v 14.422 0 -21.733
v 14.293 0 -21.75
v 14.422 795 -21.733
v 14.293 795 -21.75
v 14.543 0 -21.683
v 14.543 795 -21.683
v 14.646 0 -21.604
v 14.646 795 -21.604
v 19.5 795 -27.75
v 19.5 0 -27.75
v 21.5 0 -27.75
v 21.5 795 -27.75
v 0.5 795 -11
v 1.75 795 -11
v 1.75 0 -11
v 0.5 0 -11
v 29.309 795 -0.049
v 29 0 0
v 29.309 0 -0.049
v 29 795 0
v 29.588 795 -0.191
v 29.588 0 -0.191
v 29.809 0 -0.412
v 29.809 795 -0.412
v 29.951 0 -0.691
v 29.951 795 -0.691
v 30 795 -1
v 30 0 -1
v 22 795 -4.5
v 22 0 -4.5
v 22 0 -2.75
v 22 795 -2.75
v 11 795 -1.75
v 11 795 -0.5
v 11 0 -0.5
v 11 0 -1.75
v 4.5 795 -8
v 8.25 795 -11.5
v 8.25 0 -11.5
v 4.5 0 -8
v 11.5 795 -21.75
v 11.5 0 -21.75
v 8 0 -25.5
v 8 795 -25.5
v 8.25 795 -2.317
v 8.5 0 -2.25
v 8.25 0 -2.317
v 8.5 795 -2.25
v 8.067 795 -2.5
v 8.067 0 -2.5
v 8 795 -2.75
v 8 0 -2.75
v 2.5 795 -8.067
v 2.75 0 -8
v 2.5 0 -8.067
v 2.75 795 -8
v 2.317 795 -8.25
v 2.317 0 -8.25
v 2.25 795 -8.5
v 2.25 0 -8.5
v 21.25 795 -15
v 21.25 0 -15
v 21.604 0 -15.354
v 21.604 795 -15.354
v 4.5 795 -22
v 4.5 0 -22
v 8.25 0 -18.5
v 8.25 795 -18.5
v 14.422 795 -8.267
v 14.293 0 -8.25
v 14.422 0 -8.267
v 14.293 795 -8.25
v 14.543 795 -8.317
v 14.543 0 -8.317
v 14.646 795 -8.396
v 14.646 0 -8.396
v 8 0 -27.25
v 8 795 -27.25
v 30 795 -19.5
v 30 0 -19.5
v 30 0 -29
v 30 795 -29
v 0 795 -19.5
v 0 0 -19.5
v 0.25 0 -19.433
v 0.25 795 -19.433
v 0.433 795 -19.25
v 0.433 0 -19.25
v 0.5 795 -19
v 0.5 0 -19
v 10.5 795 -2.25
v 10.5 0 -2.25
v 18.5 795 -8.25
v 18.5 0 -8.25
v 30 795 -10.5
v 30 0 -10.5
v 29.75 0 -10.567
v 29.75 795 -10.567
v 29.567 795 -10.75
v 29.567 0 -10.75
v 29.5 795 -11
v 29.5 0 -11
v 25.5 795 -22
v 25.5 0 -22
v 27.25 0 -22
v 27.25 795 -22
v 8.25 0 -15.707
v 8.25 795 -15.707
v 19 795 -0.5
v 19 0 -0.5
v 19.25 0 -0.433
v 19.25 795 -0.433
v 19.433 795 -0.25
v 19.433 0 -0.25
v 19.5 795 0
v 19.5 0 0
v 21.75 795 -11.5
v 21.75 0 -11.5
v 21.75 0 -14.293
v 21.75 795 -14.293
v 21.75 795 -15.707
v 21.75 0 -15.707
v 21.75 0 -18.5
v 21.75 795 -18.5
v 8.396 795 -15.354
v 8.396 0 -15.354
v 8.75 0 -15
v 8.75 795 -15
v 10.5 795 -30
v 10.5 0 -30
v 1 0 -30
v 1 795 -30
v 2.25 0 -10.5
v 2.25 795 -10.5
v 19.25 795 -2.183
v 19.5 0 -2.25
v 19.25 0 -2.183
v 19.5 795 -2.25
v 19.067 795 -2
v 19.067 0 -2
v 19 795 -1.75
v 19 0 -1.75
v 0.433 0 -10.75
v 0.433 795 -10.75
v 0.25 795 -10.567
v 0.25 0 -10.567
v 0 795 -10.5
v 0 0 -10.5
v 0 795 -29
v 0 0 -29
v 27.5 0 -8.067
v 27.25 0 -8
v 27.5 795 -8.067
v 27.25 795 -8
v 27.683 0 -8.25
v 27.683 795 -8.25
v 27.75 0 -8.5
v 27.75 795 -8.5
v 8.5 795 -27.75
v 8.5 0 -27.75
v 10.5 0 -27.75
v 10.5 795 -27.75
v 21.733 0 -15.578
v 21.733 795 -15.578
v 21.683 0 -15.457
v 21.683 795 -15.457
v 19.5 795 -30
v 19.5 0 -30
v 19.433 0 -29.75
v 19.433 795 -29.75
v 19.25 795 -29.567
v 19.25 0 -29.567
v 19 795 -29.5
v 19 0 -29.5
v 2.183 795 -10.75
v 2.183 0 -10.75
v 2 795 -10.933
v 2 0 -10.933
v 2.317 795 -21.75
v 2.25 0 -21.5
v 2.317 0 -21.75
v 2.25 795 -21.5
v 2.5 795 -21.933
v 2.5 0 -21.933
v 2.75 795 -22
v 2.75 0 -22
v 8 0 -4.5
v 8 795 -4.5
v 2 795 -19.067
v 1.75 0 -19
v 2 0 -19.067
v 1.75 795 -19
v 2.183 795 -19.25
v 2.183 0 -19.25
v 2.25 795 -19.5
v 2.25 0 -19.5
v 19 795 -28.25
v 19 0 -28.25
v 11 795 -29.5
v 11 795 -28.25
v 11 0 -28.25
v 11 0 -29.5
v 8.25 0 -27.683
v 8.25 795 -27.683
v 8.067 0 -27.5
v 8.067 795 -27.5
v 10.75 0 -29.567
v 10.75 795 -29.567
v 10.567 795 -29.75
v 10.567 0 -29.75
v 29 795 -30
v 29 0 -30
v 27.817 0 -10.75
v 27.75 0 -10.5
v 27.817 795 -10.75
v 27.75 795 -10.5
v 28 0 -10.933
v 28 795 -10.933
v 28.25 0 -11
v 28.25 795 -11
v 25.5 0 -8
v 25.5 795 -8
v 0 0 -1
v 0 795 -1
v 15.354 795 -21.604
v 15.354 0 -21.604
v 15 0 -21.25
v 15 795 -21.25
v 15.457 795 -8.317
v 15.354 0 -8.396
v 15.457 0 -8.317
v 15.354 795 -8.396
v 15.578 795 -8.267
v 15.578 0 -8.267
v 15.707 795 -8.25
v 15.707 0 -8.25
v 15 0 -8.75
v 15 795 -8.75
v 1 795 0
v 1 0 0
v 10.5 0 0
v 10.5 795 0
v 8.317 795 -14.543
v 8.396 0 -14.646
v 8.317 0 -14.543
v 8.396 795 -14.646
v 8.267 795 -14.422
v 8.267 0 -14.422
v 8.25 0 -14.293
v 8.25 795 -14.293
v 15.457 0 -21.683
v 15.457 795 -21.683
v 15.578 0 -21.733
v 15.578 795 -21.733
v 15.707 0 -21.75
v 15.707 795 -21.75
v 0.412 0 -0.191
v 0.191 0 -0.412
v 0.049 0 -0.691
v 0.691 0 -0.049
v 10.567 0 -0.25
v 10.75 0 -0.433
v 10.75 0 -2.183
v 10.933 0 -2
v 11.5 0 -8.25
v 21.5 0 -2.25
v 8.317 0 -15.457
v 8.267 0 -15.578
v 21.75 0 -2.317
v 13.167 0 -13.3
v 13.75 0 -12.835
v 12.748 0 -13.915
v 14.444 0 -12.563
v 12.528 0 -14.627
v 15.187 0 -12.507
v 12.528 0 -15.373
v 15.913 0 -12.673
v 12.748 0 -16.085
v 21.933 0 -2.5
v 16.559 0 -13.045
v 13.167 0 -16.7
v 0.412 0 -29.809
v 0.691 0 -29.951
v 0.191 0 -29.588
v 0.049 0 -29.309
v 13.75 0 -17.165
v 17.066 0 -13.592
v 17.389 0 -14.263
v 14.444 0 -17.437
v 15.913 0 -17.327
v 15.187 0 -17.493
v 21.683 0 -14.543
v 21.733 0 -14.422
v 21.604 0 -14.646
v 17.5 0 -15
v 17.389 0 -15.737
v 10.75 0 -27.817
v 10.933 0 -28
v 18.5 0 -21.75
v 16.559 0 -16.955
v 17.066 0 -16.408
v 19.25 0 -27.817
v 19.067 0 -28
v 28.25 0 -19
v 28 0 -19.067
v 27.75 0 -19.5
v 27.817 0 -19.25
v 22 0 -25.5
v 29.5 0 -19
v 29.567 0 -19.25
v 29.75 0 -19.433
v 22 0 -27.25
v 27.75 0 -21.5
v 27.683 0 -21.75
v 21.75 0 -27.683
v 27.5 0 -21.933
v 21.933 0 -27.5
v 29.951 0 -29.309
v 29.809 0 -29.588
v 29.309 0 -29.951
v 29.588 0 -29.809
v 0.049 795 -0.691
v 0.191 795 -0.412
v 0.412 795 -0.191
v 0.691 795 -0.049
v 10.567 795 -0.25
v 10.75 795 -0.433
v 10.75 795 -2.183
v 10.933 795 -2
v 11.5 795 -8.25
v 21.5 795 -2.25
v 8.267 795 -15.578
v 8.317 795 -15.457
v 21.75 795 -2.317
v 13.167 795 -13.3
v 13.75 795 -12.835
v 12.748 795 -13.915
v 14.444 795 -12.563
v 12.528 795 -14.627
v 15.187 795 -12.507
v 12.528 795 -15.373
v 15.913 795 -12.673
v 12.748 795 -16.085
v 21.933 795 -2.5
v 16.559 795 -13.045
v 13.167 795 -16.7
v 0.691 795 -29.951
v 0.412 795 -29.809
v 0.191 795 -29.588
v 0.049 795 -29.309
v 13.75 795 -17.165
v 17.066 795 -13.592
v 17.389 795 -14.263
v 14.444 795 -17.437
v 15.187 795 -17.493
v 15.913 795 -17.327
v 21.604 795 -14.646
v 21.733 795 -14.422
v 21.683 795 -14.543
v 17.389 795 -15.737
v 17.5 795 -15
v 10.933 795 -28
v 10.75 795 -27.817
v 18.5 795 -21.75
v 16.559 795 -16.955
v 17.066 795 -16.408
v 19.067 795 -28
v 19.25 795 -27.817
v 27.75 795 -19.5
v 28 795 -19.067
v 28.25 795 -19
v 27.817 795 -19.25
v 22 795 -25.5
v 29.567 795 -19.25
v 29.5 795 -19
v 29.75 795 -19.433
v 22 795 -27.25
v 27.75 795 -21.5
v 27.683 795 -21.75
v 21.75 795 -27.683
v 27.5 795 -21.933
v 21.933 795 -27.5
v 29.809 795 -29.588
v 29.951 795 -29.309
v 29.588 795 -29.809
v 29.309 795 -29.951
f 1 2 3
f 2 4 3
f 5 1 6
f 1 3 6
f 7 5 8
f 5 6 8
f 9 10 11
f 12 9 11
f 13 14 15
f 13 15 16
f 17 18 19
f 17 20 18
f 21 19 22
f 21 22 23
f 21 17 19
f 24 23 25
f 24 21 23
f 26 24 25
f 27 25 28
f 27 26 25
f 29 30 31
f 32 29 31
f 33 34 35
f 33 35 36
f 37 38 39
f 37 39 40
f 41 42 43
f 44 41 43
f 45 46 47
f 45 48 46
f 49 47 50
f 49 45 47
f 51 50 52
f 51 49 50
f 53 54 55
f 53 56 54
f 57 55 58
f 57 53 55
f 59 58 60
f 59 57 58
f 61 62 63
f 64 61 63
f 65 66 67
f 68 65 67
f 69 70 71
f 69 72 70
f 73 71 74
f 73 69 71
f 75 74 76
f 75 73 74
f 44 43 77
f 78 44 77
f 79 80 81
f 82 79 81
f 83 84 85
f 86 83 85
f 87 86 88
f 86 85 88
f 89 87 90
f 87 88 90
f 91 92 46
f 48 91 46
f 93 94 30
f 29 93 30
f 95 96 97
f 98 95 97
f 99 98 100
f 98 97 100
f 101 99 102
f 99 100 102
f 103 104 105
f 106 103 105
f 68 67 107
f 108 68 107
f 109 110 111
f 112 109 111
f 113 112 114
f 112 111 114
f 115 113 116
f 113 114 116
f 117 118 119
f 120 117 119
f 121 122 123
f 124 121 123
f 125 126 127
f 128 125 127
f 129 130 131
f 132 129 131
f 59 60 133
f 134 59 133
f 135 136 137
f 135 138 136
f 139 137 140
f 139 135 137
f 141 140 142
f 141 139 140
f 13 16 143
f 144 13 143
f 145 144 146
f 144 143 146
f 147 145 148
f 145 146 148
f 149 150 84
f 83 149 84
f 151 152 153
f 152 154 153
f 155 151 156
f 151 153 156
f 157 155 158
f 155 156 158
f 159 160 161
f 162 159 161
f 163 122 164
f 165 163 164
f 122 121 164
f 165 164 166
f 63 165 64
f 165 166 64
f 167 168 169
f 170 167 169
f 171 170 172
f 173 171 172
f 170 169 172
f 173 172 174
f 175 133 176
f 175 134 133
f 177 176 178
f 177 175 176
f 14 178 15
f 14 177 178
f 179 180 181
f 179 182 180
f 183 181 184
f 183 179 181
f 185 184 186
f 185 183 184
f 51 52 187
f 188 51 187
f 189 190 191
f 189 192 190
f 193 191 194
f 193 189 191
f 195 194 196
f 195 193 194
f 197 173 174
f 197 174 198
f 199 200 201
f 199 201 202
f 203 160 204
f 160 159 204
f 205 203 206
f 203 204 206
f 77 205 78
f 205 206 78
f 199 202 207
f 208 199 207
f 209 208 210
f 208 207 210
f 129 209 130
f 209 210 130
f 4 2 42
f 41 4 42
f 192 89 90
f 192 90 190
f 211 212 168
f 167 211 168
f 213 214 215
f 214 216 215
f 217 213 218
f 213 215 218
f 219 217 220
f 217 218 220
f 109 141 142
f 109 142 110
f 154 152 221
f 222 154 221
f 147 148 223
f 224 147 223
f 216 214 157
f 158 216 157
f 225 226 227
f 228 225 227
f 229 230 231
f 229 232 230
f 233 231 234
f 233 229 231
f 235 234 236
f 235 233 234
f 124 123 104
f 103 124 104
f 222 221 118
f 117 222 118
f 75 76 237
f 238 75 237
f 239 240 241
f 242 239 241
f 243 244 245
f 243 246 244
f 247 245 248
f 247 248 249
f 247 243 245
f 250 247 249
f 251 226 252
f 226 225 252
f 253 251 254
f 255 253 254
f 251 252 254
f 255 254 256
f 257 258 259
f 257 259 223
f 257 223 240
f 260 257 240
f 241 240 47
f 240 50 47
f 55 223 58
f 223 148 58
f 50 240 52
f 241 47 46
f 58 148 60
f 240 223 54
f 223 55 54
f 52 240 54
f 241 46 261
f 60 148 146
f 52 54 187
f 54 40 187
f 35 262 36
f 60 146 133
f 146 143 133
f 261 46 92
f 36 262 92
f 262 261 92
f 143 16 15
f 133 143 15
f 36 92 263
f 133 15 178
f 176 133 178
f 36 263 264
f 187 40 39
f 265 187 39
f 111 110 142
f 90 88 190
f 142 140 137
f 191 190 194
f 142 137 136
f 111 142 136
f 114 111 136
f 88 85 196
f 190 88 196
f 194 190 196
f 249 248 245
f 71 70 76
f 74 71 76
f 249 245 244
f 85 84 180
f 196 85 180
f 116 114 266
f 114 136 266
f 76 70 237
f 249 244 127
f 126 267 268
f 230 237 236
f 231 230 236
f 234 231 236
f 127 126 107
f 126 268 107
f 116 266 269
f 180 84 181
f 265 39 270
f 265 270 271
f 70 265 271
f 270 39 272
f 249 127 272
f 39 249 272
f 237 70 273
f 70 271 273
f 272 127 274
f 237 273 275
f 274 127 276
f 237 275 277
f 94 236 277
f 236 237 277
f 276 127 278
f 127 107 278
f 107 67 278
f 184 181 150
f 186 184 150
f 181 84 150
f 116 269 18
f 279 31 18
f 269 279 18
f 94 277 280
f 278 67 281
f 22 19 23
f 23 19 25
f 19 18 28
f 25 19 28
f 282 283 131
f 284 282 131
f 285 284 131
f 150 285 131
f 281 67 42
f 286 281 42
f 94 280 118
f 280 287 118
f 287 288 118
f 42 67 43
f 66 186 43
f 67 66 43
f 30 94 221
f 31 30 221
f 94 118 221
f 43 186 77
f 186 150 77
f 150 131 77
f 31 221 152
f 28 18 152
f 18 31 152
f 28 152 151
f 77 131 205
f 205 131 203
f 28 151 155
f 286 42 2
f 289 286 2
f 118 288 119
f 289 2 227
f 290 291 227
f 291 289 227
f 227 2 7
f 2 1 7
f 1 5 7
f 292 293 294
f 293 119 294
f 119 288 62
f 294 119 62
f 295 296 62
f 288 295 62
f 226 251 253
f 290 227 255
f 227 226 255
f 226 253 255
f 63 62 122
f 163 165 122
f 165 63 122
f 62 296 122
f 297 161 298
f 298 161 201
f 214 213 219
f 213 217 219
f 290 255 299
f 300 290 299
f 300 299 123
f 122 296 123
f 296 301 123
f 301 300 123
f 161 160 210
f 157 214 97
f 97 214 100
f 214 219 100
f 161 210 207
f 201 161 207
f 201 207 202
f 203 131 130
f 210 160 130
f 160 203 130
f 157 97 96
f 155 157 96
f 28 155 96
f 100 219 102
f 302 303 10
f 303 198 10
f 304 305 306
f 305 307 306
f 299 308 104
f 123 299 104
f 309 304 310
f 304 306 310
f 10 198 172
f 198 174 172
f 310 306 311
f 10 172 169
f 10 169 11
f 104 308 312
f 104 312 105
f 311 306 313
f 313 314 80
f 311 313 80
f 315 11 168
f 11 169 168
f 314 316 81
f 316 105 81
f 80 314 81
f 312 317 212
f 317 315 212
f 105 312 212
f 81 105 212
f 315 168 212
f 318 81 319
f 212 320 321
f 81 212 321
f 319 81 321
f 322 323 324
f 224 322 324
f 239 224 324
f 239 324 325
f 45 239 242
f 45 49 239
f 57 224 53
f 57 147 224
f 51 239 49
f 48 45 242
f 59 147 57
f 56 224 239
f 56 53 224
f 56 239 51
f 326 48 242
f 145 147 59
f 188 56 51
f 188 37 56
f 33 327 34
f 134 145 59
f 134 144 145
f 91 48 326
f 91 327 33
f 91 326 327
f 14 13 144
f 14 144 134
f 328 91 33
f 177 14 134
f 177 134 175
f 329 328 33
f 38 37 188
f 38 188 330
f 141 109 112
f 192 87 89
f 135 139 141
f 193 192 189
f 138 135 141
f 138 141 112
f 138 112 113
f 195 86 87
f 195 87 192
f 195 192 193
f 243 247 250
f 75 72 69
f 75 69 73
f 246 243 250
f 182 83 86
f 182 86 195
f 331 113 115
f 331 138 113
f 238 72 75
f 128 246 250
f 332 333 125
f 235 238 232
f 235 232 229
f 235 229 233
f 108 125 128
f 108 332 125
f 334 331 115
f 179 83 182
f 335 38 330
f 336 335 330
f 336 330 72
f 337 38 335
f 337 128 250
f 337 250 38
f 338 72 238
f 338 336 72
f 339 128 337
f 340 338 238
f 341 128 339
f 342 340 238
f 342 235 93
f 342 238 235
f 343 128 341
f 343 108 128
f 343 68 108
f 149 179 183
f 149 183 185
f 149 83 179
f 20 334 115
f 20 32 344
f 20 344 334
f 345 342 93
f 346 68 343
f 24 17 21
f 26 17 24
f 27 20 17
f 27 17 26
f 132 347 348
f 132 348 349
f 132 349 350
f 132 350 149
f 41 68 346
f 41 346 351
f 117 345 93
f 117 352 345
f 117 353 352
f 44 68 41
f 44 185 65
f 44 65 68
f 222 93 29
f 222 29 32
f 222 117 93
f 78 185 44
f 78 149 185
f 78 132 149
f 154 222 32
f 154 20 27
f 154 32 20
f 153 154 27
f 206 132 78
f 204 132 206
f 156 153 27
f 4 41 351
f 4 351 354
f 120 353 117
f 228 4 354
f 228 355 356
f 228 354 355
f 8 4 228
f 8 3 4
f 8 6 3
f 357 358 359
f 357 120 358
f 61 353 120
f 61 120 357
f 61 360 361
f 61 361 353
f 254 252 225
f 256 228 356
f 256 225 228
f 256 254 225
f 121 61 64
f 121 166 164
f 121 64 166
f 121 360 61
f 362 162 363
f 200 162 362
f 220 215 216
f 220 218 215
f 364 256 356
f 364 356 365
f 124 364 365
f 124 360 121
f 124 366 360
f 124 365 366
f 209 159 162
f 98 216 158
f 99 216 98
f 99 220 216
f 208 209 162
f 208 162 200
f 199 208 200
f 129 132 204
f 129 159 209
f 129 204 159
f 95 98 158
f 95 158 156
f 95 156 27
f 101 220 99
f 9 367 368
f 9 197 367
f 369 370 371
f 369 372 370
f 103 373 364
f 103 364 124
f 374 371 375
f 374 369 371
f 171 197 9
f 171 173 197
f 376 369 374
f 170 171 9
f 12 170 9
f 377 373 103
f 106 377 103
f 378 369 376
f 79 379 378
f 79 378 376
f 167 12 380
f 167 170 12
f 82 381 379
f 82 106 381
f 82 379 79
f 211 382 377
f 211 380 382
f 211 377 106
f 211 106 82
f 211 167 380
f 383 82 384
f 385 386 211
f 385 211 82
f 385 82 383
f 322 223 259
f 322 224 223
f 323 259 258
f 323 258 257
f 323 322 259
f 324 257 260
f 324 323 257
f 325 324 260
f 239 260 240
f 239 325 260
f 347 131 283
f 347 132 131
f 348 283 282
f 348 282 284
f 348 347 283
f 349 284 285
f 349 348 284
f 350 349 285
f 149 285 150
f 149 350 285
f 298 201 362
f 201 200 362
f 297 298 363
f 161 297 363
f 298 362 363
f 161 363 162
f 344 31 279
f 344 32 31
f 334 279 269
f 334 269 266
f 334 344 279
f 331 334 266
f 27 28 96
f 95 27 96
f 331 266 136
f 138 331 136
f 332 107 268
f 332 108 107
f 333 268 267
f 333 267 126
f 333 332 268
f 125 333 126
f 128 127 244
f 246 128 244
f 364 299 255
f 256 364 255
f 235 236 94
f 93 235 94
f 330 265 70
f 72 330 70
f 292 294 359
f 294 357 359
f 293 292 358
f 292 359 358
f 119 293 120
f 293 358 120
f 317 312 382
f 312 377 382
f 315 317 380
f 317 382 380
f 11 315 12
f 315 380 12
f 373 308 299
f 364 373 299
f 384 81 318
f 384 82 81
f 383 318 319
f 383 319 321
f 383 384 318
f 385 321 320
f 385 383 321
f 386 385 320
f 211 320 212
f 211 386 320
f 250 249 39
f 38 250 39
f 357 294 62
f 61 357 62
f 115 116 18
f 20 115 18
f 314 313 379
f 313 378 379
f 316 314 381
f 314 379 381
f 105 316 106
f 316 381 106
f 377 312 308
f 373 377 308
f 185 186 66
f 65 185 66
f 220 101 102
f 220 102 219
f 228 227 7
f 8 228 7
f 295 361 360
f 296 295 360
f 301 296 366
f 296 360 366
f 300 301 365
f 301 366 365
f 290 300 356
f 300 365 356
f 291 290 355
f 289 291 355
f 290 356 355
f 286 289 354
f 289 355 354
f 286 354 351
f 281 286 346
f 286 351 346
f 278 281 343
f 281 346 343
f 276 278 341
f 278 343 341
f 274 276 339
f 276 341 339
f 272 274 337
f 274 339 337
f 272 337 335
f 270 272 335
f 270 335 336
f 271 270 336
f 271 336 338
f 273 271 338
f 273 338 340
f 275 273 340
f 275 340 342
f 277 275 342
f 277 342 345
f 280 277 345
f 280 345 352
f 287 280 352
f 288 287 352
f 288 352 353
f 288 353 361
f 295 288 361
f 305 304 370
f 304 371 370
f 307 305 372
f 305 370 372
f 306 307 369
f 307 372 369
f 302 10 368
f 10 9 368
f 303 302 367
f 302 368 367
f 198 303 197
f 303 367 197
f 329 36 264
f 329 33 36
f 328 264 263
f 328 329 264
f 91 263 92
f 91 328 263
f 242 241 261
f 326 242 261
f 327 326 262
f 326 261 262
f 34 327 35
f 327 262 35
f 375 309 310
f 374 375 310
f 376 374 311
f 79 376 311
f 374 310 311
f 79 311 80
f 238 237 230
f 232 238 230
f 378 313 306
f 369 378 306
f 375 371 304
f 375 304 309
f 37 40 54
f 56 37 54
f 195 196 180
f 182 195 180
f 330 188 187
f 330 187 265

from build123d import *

# Parameters (mm, degrees)
BOSS_EXTRUDE1_DEPTH = 795
FILLET1_R           = 1
SKETCH4_R           = 2.5
CUT_EXTRUDE1_DEPTH  = 796
FILLET2_R           = 0.5


with BuildPart() as part:
    # Sketch3 → Boss-Extrude1 (new body)
    with BuildSketch(Plane(origin=(0, 0, 0), x_dir=(1, 0, 0), z_dir=(0, 1, 0))):
        with BuildLine():
            Line((11, 27.75), (11, 29.5))
            ThreePointArc((11, 29.5), (10.646446609, 29.646446609), (10.5, 30))
            Line((10.5, 30), (0, 30))
            Line((0, 30), (0, 19.5))
            ThreePointArc((0, 19.5), (0.353553391, 19.353553391), (0.5, 19))
            Line((0.5, 19), (2.25, 19))
            Line((2.25, 19), (2.25, 22))
            Line((2.25, 22), (4.5, 22))
            Line((4.5, 22), (8.25, 18.5))
            Line((8.25, 18.5), (8.25, 15.5))
            Line((8.25, 15.5), (8.75, 15))
            Line((8.75, 15), (8.25, 14.5))
            Line((8.25, 14.5), (8.25, 11.5))
            Line((8.25, 11.5), (4.5, 8))
            Line((4.5, 8), (2.25, 8))
            Line((2.25, 8), (2.25, 11))
            Line((2.25, 11), (0.5, 11))
            ThreePointArc((0.5, 11), (0.353553391, 10.646446609), (0, 10.5))
            Line((0, 10.5), (0, 0))
            Line((0, 0), (10.5, 0))
            ThreePointArc((10.5, 0), (10.646446609, 0.353553391), (11, 0.5))
            Line((11, 0.5), (11, 2.25))
            Line((11, 2.25), (8, 2.25))
            Line((8, 2.25), (8, 4.5))
            Line((8, 4.5), (11.5, 8.25))
            Line((11.5, 8.25), (14.5, 8.25))
            Line((14.5, 8.25), (15, 8.75))
            Line((15, 8.75), (15.5, 8.25))
            Line((15.5, 8.25), (18.5, 8.25))
            Line((18.5, 8.25), (22, 4.5))
            Line((22, 4.5), (22, 2.25))
            Line((22, 2.25), (19, 2.25))
            Line((19, 2.25), (19, 0.5))
            ThreePointArc((19, 0.5), (19.353553391, 0.353553391), (19.5, 0))
            Line((19.5, 0), (30, 0))
            Line((30, 0), (30, 10.5))
            ThreePointArc((30, 10.5), (29.646446609, 10.646446609), (29.5, 11))
            Line((29.5, 11), (27.75, 11))
            Line((27.75, 11), (27.75, 8))
            Line((27.75, 8), (25.5, 8))
            Line((25.5, 8), (21.75, 11.5))
            Line((21.75, 11.5), (21.75, 14.5))
            Line((21.75, 14.5), (21.25, 15))
            Line((21.25, 15), (21.75, 15.5))
            Line((21.75, 15.5), (21.75, 18.5))
            Line((21.75, 18.5), (25.5, 22))
            Line((25.5, 22), (27.75, 22))
            Line((27.75, 22), (27.75, 19))
            Line((27.75, 19), (29.5, 19))
            ThreePointArc((29.5, 19), (29.646446609, 19.353553391), (30, 19.5))
            Line((30, 19.5), (30, 30))
            Line((30, 30), (19.5, 30))
            ThreePointArc((19.5, 30), (19.353553391, 29.646446609), (19, 29.5))
            Line((19, 29.5), (19, 27.75))
            Line((19, 27.75), (22, 27.75))
            Line((22, 27.75), (22, 25.5))
            Line((22, 25.5), (18.5, 21.75))
            Line((18.5, 21.75), (15.5, 21.75))
            Line((15.5, 21.75), (15, 21.25))
            Line((15, 21.25), (14.5, 21.75))
            Line((14.5, 21.75), (11.5, 21.75))
            Line((11.5, 21.75), (8, 25.5))
            Line((8, 25.5), (8, 27.75))
            Line((8, 27.75), (11, 27.75))
        make_face()
    extrude(amount=BOSS_EXTRUDE1_DEPTH)

    # Fillet1
    fillet1_edges = [part.edges().sort_by_distance(p)[0] for p in [
        (30, 397.5, 0),
        (0, 397.5, 0),
        (0, 397.5, -30),
        (30, 397.5, -30),
    ]]
    fillet(fillet1_edges, radius=FILLET1_R)

    # Sketch4 → Cut-Extrude1 (cut, through all)
    with BuildSketch(Plane(origin=(0, 795, 0), x_dir=(1, 0, 0), z_dir=(0, 1, 0))):
        with Locations((15, 15)):
            Circle(SKETCH4_R)
    extrude(amount=-CUT_EXTRUDE1_DEPTH, mode=Mode.SUBTRACT)

    # Fillet2
    fillet2_edges = [part.edges().sort_by_distance(p)[0] for p in [
        (27.75, 397.5, -19),
        (27.75, 397.5, -22),
        (21.75, 397.5, -15.5),
        (21.75, 397.5, -14.5),
        (27.75, 397.5, -8),
        (27.75, 397.5, -11),
        (19, 397.5, -2.25),
        (22, 397.5, -2.25),
        (15.5, 397.5, -8.25),
        (14.5, 397.5, -8.25),
        (8, 397.5, -2.25),
        (11, 397.5, -2.25),
        (2.25, 397.5, -11),
        (2.25, 397.5, -8),
        (8.25, 397.5, -14.5),
        (8.25, 397.5, -15.5),
        (2.25, 397.5, -22),
        (2.25, 397.5, -19),
        (11, 397.5, -27.75),
        (8, 397.5, -27.75),
        (14.5, 397.5, -21.75),
        (15.5, 397.5, -21.75),
        (22, 397.5, -27.75),
        (19, 397.5, -27.75),
    ]]
    fillet(fillet2_edges, radius=FILLET2_R)


solid = part.part
